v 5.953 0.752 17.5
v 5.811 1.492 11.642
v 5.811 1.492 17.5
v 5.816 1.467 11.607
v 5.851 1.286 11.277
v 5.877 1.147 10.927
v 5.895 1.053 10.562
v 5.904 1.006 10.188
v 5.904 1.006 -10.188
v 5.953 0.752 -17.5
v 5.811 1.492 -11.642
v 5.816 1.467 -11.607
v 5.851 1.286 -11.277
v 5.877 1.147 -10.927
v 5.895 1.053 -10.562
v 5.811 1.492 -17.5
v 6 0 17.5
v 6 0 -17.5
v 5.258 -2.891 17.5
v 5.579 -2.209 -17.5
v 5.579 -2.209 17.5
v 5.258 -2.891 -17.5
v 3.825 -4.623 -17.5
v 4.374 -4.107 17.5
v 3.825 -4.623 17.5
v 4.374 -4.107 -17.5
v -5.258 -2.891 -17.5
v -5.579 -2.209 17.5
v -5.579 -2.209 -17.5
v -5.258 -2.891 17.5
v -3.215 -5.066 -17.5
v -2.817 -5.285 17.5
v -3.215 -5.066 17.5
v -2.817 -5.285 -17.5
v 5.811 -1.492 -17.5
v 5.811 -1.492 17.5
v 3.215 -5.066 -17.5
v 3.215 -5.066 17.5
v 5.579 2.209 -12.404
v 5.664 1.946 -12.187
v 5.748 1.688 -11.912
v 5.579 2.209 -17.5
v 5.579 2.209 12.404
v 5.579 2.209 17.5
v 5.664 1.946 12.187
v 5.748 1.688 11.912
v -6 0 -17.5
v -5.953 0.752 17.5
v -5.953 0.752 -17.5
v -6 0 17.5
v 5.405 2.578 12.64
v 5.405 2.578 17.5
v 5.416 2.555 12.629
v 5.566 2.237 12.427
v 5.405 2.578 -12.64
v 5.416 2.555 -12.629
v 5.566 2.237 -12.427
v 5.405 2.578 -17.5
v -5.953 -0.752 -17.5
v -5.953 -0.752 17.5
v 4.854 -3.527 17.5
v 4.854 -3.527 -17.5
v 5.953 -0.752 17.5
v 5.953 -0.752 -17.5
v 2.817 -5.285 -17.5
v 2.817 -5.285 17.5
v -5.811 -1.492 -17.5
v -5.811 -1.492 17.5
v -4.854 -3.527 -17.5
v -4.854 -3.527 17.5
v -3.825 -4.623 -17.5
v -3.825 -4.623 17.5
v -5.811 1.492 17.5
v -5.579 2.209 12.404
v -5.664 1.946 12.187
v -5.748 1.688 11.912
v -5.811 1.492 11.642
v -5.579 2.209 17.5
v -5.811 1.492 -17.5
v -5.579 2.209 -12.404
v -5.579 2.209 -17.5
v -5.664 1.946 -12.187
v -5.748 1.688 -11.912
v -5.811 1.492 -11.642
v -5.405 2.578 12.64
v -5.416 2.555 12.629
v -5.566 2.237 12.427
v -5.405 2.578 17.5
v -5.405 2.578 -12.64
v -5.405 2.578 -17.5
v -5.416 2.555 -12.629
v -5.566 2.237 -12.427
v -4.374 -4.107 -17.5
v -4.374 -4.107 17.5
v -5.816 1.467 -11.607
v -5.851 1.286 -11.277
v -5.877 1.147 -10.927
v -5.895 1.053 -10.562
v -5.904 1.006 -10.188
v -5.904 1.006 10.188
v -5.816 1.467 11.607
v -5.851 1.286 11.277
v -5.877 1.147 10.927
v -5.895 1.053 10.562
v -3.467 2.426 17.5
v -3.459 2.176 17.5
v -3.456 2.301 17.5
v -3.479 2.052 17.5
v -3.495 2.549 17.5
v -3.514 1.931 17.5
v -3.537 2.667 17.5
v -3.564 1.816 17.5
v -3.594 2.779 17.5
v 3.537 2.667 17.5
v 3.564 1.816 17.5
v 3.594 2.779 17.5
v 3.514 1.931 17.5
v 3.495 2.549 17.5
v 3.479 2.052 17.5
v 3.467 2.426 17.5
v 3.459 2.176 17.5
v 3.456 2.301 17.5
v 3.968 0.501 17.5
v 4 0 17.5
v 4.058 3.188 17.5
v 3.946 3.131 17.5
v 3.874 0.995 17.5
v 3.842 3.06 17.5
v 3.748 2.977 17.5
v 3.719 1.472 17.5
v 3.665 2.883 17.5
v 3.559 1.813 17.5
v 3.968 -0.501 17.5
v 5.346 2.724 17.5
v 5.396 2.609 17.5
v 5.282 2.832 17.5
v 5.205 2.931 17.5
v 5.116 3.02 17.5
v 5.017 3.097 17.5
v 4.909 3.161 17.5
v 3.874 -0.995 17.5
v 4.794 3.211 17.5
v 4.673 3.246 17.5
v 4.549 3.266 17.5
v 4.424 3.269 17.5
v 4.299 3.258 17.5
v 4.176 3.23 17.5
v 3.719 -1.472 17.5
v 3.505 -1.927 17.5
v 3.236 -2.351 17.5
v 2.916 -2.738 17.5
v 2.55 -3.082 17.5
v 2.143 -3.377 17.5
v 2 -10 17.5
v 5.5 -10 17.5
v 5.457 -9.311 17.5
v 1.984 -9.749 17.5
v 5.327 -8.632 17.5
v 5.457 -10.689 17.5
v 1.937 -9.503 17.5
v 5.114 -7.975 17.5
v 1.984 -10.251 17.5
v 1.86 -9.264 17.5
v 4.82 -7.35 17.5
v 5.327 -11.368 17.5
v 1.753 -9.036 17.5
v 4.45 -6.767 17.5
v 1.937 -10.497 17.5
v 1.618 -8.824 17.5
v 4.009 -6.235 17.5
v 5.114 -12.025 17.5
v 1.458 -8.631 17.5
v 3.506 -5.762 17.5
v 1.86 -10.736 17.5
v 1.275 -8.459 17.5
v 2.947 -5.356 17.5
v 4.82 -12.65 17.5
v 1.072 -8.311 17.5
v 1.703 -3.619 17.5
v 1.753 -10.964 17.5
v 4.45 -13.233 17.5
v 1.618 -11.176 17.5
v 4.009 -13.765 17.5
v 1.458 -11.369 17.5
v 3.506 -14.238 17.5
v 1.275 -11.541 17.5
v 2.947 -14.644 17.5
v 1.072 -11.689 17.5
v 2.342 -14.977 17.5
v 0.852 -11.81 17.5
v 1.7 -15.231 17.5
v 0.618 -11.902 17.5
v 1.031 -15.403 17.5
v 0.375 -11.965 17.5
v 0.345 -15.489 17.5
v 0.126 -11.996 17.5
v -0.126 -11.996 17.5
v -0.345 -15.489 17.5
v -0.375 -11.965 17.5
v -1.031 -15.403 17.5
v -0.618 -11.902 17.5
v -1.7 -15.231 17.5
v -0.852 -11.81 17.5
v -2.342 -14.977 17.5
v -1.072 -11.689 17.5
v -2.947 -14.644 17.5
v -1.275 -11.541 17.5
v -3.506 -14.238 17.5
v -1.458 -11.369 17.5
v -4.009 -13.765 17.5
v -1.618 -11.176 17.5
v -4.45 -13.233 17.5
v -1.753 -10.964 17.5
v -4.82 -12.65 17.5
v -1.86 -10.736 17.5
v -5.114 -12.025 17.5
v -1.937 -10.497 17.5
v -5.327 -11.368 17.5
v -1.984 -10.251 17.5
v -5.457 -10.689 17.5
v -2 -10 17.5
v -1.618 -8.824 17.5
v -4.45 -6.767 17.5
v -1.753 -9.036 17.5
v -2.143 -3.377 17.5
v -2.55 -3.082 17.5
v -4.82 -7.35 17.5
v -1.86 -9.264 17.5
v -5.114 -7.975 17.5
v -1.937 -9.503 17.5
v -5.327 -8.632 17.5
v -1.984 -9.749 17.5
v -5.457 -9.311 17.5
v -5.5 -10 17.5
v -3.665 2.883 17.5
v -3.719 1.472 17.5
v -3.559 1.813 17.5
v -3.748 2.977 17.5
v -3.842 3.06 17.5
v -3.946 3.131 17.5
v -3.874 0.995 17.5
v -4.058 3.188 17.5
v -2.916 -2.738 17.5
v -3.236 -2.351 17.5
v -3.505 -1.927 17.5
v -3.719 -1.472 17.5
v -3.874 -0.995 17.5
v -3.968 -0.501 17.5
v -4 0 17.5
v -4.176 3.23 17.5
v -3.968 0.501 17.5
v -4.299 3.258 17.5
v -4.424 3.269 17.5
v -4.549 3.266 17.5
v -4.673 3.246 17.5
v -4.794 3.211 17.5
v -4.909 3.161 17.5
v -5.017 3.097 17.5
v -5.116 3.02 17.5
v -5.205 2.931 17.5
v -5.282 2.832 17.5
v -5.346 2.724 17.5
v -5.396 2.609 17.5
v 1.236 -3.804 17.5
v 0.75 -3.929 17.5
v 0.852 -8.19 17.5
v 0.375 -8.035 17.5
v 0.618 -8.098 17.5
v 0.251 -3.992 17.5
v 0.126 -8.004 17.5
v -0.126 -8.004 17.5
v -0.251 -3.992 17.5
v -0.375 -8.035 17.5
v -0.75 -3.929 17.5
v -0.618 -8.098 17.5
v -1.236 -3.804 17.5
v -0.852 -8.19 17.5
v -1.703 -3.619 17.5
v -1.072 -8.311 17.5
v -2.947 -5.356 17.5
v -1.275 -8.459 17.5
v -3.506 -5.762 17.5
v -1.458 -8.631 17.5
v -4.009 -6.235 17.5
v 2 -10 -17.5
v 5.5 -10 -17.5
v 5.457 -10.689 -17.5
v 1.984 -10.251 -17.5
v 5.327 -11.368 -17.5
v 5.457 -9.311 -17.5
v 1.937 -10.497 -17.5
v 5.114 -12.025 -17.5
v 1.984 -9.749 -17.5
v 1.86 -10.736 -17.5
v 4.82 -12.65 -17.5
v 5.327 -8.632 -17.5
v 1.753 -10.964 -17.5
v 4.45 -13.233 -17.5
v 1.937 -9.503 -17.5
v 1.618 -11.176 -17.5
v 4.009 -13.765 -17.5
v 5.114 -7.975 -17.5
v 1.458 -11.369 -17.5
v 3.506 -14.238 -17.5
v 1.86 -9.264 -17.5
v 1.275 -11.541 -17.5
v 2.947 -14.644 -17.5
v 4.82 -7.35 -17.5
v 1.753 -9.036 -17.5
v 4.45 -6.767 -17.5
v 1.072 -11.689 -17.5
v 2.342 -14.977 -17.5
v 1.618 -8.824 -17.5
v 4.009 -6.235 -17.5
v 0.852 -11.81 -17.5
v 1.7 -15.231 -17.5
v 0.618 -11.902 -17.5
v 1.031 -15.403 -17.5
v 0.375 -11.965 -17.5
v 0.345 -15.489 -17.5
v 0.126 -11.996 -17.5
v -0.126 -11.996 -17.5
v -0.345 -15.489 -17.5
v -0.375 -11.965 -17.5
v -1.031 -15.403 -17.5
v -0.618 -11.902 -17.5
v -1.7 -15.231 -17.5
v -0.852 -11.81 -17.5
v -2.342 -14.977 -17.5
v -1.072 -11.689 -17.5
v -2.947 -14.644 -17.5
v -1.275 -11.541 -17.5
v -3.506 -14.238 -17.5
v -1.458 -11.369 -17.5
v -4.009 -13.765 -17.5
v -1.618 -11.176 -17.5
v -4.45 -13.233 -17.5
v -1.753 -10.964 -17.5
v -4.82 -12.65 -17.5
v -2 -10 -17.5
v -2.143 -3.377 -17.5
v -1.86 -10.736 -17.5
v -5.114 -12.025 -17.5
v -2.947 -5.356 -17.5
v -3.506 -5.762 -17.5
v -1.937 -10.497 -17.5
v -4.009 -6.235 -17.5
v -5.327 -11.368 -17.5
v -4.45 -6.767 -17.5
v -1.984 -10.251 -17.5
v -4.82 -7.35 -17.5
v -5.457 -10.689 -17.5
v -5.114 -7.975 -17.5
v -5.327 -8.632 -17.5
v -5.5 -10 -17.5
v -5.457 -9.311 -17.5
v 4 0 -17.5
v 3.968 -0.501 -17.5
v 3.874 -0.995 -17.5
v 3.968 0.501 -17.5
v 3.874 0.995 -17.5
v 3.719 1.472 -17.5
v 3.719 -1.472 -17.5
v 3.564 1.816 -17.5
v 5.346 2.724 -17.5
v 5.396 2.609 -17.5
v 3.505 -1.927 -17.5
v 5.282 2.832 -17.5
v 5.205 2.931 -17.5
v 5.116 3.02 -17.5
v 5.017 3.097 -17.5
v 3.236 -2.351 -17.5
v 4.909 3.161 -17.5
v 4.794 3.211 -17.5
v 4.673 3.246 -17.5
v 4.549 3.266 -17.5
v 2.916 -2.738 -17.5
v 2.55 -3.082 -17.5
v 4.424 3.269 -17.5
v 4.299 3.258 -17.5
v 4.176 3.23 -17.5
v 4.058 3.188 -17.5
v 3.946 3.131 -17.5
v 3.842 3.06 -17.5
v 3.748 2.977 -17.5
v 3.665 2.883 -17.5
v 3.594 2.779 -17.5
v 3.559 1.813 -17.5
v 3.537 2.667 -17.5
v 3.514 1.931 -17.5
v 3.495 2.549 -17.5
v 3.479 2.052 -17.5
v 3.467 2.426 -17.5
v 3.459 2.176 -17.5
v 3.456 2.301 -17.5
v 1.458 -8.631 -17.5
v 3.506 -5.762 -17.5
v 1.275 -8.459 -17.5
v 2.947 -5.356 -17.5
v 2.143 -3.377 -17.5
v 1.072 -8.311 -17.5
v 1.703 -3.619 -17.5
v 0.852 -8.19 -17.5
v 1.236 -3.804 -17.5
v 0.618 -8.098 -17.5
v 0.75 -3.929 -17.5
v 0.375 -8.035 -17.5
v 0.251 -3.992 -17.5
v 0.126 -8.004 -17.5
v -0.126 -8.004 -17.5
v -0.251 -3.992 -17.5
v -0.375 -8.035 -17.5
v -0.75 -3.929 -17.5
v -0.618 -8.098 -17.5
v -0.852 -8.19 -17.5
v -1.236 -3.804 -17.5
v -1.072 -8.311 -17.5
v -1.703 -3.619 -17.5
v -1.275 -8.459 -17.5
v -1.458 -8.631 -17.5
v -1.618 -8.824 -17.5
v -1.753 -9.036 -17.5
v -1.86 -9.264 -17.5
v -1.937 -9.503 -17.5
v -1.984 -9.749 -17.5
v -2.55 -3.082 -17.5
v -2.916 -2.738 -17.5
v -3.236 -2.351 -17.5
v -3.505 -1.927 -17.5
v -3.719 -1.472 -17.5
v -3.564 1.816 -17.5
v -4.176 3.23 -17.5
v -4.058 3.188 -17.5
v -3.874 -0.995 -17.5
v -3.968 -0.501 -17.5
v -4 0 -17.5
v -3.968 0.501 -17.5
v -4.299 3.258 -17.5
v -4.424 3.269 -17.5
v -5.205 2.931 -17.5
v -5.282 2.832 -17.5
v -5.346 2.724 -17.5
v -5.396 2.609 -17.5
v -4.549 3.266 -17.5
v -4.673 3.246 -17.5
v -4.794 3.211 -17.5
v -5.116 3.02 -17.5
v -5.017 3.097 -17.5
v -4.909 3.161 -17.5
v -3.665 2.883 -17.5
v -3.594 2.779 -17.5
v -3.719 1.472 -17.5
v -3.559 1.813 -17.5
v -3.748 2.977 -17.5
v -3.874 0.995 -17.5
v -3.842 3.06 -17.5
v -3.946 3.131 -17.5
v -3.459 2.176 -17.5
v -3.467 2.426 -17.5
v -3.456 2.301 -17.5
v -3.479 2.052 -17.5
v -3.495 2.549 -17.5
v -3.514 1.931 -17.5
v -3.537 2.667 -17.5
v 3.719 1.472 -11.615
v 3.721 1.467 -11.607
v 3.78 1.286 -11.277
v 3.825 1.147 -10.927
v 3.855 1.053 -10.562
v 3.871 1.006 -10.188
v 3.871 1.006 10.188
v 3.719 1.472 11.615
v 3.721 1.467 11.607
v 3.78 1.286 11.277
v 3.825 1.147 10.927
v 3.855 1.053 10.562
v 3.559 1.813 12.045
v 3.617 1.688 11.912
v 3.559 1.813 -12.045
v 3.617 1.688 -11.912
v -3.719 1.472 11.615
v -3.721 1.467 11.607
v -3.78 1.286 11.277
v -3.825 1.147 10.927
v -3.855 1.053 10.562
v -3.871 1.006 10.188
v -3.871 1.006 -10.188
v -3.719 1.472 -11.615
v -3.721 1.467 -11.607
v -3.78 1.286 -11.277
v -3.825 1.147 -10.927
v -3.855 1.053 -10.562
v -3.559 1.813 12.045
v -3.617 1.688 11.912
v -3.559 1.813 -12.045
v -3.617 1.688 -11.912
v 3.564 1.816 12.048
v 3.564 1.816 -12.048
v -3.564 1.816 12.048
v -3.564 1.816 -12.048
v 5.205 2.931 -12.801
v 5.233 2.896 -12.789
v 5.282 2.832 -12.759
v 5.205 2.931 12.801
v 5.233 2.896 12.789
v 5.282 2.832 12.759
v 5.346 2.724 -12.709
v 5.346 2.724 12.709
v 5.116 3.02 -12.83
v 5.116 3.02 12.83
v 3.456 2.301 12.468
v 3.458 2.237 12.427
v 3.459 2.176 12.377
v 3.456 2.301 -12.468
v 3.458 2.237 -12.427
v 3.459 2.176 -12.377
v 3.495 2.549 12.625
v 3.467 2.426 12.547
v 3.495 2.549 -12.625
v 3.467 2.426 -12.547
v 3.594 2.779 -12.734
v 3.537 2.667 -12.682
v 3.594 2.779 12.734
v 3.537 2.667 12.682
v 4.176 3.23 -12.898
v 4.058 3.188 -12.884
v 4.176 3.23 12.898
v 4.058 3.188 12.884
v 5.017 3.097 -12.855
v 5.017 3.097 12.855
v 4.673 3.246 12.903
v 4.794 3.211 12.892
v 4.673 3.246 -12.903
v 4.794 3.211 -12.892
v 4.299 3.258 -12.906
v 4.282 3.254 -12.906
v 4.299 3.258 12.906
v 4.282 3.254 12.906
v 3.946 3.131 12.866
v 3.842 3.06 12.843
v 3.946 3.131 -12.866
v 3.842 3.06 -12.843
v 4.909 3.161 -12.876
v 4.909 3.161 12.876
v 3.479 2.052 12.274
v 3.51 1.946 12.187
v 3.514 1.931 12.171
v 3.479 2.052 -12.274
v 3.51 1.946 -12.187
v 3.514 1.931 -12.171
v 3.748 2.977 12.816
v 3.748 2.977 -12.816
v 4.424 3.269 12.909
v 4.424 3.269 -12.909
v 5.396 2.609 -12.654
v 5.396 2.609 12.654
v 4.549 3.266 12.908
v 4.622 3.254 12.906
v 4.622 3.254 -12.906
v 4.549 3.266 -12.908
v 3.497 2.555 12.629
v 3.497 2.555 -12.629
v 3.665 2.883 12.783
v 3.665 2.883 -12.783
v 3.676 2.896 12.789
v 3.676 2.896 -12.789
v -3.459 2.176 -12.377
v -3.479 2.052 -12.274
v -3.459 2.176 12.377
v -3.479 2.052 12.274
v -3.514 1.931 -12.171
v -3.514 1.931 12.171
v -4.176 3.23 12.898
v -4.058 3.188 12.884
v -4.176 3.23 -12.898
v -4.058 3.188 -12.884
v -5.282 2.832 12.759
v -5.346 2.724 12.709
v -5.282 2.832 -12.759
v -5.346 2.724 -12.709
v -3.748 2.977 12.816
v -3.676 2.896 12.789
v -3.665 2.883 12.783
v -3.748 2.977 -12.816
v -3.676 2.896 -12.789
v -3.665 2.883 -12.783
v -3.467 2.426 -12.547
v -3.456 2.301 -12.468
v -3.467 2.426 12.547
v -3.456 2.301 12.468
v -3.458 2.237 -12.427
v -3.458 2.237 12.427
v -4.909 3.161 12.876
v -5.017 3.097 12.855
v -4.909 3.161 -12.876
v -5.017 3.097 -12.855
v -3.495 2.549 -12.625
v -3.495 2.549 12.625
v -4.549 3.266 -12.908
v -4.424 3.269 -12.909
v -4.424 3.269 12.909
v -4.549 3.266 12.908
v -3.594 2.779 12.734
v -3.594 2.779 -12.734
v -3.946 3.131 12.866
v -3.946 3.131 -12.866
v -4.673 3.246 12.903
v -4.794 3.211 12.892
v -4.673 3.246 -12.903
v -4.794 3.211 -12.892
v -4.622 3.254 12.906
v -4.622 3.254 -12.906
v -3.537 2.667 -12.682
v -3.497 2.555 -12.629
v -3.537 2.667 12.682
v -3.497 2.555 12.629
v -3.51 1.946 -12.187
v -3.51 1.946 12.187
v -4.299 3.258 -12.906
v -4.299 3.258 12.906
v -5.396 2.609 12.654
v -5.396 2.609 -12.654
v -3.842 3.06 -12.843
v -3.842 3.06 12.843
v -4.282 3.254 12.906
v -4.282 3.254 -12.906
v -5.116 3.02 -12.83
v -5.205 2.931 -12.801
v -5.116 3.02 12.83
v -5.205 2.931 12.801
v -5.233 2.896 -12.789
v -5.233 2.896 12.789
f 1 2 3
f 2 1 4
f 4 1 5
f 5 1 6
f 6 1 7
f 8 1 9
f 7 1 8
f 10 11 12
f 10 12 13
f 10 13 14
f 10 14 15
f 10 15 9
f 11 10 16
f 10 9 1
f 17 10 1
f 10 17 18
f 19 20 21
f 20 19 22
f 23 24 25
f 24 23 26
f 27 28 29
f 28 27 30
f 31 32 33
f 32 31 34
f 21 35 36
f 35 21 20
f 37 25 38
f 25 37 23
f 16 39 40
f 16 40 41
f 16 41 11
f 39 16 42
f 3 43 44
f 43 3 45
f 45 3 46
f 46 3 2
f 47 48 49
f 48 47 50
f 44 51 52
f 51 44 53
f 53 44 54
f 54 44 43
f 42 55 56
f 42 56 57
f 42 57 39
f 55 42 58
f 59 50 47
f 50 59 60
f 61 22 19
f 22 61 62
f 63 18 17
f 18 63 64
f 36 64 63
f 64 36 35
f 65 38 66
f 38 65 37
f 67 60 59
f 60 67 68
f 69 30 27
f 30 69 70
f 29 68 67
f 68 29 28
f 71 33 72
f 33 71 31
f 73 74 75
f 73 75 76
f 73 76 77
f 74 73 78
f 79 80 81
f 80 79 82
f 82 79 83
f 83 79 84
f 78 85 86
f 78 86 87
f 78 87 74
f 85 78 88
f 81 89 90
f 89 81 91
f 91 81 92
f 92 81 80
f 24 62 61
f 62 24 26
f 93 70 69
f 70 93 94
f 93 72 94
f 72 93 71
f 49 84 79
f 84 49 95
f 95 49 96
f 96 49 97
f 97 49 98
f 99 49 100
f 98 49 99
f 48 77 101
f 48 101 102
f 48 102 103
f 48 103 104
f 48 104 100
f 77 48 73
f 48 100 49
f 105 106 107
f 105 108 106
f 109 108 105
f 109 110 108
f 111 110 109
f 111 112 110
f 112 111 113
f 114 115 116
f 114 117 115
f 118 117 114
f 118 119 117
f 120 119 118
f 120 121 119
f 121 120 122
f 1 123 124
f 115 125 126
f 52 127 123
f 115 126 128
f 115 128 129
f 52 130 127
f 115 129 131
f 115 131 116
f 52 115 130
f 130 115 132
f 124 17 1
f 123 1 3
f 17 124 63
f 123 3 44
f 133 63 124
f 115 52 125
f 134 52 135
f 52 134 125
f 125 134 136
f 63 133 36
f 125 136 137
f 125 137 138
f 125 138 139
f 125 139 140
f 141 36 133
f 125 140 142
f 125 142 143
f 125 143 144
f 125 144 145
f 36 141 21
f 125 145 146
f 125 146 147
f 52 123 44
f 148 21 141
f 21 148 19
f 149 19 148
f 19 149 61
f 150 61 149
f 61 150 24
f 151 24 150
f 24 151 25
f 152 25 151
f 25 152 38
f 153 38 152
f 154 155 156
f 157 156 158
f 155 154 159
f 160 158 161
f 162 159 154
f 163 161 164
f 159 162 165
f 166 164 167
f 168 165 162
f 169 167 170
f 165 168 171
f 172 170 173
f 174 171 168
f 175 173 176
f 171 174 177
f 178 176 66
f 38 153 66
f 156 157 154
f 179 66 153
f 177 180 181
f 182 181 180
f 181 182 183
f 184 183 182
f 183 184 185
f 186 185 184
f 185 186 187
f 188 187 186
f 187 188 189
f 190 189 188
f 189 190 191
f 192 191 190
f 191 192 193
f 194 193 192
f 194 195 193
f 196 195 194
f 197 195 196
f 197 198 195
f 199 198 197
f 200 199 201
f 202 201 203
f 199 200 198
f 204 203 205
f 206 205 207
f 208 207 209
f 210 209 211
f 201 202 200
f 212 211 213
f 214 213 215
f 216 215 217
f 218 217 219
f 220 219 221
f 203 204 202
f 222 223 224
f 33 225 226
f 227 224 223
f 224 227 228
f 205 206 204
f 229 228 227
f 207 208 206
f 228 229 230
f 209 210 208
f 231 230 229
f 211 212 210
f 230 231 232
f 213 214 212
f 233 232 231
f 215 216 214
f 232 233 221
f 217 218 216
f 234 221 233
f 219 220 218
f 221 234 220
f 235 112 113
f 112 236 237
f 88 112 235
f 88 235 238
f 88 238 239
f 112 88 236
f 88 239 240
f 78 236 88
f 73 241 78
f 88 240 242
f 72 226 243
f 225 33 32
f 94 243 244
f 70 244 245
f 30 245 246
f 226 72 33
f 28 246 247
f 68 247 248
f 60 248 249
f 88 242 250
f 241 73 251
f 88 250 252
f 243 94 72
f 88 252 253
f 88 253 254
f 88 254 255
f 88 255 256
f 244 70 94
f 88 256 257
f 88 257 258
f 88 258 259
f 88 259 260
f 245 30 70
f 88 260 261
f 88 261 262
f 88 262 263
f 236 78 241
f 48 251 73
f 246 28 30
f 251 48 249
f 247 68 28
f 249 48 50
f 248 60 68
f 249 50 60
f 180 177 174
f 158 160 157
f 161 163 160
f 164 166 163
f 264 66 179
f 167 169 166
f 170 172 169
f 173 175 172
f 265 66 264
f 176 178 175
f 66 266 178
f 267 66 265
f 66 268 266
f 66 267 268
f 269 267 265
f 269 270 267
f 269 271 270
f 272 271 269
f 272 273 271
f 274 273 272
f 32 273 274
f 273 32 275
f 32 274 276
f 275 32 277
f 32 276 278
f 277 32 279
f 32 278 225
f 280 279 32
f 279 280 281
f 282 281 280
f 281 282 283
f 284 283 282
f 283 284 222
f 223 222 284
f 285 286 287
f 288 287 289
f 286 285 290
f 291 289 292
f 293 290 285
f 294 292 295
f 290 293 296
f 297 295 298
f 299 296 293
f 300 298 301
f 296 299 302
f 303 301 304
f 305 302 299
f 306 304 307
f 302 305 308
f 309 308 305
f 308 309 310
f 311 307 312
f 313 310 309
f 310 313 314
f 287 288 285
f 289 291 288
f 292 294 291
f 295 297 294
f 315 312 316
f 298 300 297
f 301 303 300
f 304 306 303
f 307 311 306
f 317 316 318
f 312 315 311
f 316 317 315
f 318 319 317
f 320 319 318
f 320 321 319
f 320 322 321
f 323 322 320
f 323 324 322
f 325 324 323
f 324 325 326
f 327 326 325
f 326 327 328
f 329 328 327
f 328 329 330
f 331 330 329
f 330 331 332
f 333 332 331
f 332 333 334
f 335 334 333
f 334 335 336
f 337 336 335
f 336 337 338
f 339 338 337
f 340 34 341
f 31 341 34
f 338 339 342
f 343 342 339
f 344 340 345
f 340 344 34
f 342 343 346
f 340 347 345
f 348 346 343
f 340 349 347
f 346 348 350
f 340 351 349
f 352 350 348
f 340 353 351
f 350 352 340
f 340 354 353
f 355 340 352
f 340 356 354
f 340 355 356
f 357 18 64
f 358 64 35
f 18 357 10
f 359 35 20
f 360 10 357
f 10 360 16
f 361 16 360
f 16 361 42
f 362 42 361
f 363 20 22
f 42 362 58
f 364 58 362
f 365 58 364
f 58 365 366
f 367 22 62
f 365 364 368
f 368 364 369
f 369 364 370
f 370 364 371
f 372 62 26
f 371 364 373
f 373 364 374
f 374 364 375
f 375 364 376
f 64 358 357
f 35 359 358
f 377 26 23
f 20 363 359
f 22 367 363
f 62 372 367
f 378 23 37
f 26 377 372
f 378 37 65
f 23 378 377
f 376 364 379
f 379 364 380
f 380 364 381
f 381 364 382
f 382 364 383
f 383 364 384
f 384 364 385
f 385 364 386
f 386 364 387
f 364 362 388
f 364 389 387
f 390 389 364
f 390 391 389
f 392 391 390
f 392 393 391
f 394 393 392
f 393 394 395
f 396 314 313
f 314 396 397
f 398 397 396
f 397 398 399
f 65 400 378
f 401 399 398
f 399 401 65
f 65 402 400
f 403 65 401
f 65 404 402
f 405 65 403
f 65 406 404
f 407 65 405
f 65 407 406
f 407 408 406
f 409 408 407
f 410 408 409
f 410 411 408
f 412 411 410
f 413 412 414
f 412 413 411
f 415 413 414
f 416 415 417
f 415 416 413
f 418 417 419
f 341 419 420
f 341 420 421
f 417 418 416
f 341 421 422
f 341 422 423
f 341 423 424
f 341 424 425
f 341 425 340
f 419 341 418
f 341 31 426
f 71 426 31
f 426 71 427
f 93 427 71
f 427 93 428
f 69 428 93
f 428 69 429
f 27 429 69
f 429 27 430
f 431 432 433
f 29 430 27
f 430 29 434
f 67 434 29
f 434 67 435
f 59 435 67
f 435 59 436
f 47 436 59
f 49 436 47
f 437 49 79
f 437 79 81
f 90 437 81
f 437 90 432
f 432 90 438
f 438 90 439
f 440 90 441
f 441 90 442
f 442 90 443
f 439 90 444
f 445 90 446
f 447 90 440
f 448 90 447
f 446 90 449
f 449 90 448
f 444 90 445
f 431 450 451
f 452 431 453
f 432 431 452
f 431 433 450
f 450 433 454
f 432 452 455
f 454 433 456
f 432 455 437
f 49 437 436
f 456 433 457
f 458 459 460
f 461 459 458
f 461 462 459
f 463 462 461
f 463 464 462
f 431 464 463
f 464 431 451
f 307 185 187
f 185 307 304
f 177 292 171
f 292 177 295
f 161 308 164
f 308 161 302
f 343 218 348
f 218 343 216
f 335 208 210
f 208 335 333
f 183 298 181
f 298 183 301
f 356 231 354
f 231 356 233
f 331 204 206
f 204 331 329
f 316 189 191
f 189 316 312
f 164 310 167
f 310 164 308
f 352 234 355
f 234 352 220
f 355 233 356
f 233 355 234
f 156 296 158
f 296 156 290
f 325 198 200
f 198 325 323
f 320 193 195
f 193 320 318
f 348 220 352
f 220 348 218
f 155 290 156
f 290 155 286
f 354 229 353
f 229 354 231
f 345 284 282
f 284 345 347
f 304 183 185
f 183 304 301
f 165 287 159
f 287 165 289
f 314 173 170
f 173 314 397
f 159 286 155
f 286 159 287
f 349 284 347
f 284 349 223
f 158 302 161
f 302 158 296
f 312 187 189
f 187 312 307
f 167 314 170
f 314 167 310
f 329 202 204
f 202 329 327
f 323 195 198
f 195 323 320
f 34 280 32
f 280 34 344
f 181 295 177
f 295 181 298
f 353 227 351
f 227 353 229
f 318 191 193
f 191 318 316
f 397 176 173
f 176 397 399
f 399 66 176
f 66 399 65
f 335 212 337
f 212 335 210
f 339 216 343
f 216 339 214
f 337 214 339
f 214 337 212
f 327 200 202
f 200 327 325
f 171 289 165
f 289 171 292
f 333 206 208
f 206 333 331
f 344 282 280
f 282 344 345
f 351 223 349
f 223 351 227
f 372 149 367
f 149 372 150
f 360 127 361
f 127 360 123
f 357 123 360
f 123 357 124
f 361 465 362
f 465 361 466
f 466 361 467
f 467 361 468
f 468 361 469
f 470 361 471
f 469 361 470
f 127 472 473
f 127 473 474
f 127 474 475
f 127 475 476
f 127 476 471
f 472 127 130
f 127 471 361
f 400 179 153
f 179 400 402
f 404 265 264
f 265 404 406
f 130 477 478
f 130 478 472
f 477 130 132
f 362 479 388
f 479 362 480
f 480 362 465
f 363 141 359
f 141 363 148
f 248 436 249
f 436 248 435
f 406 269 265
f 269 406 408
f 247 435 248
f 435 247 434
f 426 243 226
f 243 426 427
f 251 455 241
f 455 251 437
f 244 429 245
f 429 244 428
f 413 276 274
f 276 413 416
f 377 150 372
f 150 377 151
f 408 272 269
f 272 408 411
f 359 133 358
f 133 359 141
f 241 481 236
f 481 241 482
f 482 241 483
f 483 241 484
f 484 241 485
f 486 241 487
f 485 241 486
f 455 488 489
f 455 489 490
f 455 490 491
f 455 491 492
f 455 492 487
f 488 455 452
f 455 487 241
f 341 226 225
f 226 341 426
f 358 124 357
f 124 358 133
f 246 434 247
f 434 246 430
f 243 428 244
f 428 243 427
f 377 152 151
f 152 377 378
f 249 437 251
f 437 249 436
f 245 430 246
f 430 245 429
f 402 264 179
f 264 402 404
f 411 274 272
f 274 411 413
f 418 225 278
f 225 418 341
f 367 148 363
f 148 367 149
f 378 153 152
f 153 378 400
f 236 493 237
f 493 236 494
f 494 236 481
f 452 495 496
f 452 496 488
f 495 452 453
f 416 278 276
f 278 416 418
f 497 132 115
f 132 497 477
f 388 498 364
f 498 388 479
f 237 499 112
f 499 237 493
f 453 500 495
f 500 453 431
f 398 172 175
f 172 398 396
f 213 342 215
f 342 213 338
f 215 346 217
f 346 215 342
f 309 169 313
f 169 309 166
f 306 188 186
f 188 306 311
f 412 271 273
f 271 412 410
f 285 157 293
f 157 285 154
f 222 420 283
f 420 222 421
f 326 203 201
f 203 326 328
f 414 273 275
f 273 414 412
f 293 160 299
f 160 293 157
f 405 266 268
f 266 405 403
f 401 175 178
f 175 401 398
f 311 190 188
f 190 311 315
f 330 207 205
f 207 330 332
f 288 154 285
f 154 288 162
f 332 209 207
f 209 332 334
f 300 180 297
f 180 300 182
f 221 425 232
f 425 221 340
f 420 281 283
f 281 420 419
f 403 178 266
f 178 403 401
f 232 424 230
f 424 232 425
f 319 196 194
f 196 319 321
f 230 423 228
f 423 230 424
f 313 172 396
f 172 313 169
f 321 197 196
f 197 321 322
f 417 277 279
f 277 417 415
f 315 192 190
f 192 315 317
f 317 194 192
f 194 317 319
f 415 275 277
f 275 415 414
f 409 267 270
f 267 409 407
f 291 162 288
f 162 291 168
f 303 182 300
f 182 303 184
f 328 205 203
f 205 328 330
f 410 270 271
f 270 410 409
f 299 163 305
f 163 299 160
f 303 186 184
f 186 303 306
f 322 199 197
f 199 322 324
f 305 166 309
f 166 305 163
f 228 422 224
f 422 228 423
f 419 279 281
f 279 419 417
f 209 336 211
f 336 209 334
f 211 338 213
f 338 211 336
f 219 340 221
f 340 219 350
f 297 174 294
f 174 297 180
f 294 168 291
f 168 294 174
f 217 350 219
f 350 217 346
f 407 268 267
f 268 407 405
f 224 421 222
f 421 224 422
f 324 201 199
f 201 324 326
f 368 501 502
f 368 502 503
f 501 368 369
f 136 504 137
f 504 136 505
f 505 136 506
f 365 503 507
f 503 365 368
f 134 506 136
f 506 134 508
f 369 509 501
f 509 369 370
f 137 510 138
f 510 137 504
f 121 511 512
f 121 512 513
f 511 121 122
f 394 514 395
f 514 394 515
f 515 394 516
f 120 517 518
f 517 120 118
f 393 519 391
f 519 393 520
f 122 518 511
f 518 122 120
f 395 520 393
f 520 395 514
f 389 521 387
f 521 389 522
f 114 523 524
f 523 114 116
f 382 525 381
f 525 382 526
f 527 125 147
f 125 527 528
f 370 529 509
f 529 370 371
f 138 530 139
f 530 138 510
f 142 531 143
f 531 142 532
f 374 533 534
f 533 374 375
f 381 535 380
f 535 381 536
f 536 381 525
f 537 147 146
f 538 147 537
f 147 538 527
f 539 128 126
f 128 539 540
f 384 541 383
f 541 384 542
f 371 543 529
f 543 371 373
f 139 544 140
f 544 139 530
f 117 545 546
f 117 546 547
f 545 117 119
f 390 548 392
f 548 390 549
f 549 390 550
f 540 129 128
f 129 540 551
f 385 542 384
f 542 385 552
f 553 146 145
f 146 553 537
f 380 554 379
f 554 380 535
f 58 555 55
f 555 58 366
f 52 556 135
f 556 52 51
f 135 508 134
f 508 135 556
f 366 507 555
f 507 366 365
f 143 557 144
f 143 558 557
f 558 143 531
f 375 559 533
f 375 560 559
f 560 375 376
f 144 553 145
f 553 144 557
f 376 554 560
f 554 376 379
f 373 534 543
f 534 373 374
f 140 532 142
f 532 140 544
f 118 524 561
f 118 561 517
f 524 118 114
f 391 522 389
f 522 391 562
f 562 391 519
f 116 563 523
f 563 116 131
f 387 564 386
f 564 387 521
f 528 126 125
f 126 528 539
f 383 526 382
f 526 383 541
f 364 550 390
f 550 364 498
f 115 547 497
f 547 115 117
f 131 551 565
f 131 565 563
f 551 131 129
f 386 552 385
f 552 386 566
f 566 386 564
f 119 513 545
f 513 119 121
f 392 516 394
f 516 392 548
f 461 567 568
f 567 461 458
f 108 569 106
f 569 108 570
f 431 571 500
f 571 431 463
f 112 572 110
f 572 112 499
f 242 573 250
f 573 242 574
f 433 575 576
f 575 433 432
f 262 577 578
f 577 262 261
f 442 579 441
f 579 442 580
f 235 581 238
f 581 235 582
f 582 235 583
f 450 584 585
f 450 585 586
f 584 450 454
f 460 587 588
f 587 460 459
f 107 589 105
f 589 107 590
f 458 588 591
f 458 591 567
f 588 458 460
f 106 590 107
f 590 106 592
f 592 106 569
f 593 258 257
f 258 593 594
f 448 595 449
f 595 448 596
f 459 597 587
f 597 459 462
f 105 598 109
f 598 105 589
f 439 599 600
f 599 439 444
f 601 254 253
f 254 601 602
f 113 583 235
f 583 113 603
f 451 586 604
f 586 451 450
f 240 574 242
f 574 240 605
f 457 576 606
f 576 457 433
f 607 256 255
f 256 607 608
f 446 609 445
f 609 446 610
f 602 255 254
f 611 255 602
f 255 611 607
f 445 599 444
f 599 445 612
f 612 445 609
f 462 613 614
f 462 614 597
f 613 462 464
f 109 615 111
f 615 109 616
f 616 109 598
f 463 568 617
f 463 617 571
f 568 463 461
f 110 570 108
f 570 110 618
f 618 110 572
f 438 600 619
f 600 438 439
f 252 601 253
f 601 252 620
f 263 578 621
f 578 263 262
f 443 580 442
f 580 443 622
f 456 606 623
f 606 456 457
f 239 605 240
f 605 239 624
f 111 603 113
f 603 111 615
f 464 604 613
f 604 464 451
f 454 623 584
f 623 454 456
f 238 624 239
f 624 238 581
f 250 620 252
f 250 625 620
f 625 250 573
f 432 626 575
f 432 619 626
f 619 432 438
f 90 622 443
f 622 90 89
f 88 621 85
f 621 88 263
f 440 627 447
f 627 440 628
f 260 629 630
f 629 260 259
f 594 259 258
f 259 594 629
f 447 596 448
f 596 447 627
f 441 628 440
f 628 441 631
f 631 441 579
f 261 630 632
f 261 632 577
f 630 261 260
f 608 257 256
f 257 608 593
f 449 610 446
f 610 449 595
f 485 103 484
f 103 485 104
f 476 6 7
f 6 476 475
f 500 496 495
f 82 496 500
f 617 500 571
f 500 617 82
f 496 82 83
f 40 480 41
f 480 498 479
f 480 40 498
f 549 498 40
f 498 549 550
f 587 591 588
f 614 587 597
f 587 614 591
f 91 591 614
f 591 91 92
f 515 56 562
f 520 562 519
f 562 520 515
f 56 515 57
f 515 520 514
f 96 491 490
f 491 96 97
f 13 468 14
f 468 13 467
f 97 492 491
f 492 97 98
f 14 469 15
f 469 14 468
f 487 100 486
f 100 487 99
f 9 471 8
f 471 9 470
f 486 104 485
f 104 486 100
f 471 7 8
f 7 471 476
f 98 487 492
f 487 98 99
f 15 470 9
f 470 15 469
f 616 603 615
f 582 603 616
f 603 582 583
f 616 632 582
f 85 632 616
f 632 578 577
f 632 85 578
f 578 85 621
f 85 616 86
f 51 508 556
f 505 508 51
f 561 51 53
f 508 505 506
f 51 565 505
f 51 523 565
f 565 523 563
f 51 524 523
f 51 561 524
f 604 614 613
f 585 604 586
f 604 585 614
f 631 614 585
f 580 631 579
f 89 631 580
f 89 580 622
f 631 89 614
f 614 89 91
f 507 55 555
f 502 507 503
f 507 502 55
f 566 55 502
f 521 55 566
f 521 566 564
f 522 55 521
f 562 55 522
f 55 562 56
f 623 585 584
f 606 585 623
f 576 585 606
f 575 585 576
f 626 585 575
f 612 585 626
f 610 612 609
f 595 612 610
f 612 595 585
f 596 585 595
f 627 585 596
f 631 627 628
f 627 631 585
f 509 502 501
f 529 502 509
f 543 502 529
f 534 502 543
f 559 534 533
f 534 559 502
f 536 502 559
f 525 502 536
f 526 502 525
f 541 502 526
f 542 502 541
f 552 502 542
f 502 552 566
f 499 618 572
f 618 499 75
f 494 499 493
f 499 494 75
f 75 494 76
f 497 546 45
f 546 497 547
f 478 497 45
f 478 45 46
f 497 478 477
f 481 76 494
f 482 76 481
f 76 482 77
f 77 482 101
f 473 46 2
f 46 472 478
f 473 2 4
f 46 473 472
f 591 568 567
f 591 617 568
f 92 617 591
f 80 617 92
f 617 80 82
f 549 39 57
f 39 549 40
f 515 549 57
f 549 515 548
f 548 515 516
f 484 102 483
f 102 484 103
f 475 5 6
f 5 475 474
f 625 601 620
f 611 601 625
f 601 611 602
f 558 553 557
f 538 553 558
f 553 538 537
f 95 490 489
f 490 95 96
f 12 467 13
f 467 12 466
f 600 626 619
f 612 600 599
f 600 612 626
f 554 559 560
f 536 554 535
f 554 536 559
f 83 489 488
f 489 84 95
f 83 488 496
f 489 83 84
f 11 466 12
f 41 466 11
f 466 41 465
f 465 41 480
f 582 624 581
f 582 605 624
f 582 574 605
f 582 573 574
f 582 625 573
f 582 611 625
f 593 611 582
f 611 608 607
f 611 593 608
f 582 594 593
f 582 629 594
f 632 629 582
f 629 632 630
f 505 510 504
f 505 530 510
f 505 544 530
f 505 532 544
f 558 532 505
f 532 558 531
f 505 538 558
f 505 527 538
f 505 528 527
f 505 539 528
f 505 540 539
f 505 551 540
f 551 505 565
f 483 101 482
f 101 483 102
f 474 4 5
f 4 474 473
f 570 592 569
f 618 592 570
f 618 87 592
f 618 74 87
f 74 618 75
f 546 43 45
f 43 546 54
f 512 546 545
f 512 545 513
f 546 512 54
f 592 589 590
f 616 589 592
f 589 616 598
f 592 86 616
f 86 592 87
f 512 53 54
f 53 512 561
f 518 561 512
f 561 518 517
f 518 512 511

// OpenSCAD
//screw_diameter (mm)
screw_diameter = 4;  //[3,4,5,6]

//screw_diameter_offset (mm)
screw_diameter_offset = 0;  //[-0.1, 0, +0.1]

//length of the support (mm)
length = 35;

/* [Hidden] */

$fn = 50;
angle = 27;
//length of the support (mm)
length = 35;

difference() {  // diff 1
    union(){
        difference(){
            union (){
                cylinder ( d = 8+4, h = length, center = true);
                translate ([0,-10,0]) cylinder ( d = 11, h = length, center = true);
            } // end union

            // drill the clip and open it
            cylinder ( d = 8, h = length, center = true);
            rotate ([0,0,angle]) translate ([0,0,-length/2-5]) cube( [10,10,length+10], center = false);
            rotate ([0,0,-angle])  translate ([-10,0,-length/2-5]) cube( [10,10,length+10], center = false);

            // drill the screw hole
            translate ([0,-10,0])  cylinder ( d = screw_diameter+screw_diameter_offset, h = length, center = true);
        } // end diff

        // add two lips
        union (){rotate ([0,0,angle]) translate ([4+1,0,0]) cylinder (d= 2, h = length,center = true);
        rotate ([0,0,-angle]) translate ([-4-1,0,0]) cylinder (d= 2, h = length,center = true);}
    } // end union


    // make two clips     
   hull () {
        translate ([0,4,(length - 15)/2]) rotate([0,90,0]) cylinder (r= 3, h = 50, center = true);
        translate ([0,4,-(length - 15)/2]) rotate([0,90,0]) cylinder (r= 3, h = 50, center = true);
   }     
} // end diff 1
